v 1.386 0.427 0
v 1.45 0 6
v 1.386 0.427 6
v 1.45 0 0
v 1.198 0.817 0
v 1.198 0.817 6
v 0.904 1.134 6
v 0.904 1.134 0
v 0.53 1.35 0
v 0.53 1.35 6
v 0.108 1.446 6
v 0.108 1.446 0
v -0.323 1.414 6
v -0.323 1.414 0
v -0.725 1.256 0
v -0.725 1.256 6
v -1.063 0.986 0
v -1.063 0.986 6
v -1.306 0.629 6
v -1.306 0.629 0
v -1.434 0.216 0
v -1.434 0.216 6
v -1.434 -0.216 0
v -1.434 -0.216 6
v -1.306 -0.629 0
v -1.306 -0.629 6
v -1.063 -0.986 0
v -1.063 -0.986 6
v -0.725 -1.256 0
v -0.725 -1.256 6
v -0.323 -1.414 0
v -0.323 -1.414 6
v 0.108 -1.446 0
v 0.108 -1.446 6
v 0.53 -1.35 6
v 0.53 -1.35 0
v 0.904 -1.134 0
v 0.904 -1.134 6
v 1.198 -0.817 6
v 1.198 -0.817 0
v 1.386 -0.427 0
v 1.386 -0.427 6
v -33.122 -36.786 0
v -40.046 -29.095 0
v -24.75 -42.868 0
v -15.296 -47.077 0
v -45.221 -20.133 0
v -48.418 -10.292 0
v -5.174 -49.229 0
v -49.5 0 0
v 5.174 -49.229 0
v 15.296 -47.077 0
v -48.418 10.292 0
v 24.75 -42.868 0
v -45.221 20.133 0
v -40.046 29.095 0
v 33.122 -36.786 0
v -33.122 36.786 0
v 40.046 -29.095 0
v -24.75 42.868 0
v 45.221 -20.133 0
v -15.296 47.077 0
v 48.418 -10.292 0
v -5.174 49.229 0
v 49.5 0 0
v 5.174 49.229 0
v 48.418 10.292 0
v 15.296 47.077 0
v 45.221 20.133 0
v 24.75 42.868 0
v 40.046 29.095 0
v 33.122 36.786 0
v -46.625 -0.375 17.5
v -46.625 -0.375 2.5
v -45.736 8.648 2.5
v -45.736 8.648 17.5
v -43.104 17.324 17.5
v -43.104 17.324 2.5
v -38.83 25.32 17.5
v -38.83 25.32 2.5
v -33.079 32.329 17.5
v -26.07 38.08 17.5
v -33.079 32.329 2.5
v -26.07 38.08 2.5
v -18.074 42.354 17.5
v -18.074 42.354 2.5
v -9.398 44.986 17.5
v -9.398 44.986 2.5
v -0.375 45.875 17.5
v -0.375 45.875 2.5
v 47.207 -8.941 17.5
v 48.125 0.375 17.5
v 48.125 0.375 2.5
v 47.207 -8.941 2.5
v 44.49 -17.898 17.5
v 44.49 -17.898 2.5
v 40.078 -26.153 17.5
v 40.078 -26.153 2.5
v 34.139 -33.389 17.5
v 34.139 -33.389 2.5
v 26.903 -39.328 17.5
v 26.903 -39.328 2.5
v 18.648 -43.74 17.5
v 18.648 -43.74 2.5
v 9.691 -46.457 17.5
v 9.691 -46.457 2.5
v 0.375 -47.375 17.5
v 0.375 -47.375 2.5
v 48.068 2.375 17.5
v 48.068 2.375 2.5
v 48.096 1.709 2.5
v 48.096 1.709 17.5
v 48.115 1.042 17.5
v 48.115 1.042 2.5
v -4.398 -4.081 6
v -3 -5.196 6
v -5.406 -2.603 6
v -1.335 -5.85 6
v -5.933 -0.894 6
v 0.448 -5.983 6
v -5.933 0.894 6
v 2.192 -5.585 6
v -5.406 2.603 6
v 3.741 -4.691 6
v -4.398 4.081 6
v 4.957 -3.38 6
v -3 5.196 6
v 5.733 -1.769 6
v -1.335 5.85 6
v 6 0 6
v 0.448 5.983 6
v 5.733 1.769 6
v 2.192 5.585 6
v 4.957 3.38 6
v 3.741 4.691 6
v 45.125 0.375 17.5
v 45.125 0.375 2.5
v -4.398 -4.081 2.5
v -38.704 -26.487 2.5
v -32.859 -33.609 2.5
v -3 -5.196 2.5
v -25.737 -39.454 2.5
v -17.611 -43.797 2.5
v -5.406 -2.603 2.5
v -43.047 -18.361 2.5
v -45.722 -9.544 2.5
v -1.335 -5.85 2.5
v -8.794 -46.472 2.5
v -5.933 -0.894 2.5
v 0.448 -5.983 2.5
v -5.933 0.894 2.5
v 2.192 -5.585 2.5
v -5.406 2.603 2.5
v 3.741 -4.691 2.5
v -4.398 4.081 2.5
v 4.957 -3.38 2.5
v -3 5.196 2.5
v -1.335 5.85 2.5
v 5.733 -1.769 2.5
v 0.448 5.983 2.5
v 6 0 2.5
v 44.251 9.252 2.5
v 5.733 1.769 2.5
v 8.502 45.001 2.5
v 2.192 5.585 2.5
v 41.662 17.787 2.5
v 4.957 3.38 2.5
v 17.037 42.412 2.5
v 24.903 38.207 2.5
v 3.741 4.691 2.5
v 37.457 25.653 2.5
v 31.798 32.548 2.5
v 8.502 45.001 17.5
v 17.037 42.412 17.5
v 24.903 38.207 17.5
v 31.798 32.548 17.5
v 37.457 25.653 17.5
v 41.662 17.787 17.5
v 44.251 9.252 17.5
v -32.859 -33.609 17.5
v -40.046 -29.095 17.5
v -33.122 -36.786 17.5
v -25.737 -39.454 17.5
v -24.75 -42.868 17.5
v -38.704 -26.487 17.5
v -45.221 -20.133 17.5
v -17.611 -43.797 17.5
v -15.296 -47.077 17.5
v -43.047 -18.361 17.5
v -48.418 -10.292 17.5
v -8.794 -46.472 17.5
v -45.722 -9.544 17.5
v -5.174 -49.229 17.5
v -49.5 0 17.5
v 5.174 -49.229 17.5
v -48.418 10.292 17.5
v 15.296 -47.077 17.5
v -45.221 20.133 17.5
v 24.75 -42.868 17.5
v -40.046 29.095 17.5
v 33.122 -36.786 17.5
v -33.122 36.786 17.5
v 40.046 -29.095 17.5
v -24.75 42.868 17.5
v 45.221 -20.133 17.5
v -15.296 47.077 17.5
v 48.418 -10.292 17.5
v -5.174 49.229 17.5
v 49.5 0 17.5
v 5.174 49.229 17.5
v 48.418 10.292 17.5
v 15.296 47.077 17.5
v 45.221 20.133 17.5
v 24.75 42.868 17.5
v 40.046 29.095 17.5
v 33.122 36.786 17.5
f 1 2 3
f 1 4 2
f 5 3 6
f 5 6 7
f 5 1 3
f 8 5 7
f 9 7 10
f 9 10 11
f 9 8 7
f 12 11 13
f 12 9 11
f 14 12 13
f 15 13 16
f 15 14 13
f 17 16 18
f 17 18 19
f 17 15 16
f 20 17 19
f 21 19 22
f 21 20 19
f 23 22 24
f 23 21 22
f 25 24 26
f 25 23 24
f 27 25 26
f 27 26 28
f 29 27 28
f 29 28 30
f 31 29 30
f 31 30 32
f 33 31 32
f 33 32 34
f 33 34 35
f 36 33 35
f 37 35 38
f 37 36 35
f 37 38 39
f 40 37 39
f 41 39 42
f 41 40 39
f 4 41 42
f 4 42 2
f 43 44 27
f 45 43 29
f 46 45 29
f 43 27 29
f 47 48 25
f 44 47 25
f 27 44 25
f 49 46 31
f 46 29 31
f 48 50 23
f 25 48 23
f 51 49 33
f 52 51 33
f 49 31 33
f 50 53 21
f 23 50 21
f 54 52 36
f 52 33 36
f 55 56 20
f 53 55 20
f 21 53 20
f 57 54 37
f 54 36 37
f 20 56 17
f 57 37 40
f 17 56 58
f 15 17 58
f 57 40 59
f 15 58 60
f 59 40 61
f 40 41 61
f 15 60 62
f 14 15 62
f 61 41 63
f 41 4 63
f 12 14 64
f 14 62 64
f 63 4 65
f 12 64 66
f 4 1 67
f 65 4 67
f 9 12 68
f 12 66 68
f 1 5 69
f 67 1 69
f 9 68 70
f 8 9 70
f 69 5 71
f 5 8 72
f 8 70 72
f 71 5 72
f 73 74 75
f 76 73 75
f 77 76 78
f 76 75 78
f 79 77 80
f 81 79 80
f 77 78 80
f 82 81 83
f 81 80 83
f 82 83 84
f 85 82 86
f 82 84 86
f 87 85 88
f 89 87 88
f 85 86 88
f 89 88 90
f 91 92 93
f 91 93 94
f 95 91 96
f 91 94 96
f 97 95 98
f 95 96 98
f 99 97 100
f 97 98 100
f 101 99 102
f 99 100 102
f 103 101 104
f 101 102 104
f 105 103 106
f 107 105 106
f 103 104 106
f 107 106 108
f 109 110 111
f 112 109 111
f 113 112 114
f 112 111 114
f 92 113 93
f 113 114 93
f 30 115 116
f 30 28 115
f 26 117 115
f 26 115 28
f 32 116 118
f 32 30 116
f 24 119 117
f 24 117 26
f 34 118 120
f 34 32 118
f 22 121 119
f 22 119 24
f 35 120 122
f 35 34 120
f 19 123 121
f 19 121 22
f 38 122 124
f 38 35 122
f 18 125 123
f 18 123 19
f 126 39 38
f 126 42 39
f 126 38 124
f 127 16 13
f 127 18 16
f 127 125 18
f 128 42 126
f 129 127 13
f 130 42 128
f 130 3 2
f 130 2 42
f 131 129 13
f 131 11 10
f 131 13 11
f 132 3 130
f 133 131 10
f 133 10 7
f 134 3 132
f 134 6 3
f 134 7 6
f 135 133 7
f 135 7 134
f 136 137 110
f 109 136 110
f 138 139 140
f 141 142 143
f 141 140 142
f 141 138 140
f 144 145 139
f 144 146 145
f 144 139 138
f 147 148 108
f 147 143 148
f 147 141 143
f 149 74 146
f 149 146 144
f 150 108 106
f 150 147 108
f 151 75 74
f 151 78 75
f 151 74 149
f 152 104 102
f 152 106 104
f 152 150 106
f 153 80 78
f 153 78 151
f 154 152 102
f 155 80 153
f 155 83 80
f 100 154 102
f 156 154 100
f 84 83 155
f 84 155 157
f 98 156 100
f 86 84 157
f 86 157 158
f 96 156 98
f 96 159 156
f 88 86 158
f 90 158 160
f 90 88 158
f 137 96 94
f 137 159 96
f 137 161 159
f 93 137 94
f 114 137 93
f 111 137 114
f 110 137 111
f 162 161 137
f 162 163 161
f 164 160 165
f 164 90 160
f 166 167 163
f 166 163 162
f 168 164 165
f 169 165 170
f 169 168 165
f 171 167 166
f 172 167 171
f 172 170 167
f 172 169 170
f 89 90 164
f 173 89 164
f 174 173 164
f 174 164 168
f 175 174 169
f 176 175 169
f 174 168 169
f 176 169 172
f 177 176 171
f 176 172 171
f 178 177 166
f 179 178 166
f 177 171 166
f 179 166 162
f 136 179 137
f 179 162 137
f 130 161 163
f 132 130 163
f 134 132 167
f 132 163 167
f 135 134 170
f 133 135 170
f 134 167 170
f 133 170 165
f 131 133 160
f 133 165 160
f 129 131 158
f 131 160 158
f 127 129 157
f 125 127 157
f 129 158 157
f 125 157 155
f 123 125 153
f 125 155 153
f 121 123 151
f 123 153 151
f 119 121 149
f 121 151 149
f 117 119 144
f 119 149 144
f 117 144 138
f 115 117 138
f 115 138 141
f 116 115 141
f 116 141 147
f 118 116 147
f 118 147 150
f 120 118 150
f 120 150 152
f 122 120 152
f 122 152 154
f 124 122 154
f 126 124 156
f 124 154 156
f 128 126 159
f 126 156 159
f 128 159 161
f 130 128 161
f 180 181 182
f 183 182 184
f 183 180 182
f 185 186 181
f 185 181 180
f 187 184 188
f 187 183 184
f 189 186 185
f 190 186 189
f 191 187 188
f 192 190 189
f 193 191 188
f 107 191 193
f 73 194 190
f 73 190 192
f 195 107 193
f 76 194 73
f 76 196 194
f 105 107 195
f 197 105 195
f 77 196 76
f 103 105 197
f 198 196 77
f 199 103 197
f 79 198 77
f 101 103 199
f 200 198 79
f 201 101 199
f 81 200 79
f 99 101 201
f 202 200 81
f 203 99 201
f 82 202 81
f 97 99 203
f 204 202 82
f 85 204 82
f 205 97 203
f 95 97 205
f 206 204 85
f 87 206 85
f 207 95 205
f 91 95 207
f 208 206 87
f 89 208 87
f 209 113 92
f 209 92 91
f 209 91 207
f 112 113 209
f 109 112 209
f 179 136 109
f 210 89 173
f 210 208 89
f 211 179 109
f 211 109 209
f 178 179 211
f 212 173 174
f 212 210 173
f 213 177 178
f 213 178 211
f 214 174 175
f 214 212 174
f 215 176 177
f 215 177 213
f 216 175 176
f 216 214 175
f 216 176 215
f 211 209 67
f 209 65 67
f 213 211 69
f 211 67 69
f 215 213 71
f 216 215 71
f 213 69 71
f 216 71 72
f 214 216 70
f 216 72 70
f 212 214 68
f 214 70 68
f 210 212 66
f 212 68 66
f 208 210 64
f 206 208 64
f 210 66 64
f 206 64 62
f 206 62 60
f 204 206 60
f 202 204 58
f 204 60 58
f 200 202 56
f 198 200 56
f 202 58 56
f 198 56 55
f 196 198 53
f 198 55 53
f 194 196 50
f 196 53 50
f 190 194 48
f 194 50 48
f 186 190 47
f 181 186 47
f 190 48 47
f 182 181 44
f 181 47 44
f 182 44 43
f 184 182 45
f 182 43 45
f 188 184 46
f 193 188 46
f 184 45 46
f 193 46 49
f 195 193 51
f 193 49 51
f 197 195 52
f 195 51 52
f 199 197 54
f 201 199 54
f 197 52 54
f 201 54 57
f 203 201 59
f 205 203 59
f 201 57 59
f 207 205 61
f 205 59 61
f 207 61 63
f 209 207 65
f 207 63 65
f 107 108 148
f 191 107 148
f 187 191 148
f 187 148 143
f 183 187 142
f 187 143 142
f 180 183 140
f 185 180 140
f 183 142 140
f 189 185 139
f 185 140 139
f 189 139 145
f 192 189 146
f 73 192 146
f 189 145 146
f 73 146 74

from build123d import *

# Parameters (mm, degrees)
F0_R     = 49.5
F0_R_2   = 1.45
F1_DEPTH = 2.5
F2_R     = 6
F2_R_2   = 1.45
F3_DEPTH = 3.5
F4_R     = 49.5
F5_DEPTH = 15


with BuildPart() as f1:
    # F0 (on Top) → F1 (new body)
    with BuildSketch(Plane.XY):
        Circle(F0_R)
        Circle(F0_R_2, mode=Mode.SUBTRACT)
    extrude(amount=F1_DEPTH)

    # F2 (on face) → F3 (join)
    with BuildSketch(Plane.XY.offset(2.5)):
        Circle(F2_R)
        Circle(F2_R_2, mode=Mode.SUBTRACT)
    extrude(amount=F3_DEPTH)

    # F4 (on face) → F5 (join)
    with BuildSketch(Plane.XY.offset(2.5)):
        Circle(F4_R)
        with BuildLine():
            ThreePointArc((-0.375, 45.875), (31.798359, 32.548359), (45.125, 0.375))
            Line((45.125, 0.375), (48.067823, 2.375))
            ThreePointArc((48.067823, 2.375), (48.106806, 1.375297), (48.125, 0.375))
            ThreePointArc((48.125, 0.375), (34.139349, -33.389349), (0.375, -47.375))
            ThreePointArc((0.375, -47.375), (-32.859019, -33.609019), (-46.625, -0.375))
            ThreePointArc((-46.625, -0.375), (-33.078689, 32.328689), (-0.375, 45.875))
        make_face(mode=Mode.SUBTRACT)
    extrude(amount=F5_DEPTH)


solid = f1.part
